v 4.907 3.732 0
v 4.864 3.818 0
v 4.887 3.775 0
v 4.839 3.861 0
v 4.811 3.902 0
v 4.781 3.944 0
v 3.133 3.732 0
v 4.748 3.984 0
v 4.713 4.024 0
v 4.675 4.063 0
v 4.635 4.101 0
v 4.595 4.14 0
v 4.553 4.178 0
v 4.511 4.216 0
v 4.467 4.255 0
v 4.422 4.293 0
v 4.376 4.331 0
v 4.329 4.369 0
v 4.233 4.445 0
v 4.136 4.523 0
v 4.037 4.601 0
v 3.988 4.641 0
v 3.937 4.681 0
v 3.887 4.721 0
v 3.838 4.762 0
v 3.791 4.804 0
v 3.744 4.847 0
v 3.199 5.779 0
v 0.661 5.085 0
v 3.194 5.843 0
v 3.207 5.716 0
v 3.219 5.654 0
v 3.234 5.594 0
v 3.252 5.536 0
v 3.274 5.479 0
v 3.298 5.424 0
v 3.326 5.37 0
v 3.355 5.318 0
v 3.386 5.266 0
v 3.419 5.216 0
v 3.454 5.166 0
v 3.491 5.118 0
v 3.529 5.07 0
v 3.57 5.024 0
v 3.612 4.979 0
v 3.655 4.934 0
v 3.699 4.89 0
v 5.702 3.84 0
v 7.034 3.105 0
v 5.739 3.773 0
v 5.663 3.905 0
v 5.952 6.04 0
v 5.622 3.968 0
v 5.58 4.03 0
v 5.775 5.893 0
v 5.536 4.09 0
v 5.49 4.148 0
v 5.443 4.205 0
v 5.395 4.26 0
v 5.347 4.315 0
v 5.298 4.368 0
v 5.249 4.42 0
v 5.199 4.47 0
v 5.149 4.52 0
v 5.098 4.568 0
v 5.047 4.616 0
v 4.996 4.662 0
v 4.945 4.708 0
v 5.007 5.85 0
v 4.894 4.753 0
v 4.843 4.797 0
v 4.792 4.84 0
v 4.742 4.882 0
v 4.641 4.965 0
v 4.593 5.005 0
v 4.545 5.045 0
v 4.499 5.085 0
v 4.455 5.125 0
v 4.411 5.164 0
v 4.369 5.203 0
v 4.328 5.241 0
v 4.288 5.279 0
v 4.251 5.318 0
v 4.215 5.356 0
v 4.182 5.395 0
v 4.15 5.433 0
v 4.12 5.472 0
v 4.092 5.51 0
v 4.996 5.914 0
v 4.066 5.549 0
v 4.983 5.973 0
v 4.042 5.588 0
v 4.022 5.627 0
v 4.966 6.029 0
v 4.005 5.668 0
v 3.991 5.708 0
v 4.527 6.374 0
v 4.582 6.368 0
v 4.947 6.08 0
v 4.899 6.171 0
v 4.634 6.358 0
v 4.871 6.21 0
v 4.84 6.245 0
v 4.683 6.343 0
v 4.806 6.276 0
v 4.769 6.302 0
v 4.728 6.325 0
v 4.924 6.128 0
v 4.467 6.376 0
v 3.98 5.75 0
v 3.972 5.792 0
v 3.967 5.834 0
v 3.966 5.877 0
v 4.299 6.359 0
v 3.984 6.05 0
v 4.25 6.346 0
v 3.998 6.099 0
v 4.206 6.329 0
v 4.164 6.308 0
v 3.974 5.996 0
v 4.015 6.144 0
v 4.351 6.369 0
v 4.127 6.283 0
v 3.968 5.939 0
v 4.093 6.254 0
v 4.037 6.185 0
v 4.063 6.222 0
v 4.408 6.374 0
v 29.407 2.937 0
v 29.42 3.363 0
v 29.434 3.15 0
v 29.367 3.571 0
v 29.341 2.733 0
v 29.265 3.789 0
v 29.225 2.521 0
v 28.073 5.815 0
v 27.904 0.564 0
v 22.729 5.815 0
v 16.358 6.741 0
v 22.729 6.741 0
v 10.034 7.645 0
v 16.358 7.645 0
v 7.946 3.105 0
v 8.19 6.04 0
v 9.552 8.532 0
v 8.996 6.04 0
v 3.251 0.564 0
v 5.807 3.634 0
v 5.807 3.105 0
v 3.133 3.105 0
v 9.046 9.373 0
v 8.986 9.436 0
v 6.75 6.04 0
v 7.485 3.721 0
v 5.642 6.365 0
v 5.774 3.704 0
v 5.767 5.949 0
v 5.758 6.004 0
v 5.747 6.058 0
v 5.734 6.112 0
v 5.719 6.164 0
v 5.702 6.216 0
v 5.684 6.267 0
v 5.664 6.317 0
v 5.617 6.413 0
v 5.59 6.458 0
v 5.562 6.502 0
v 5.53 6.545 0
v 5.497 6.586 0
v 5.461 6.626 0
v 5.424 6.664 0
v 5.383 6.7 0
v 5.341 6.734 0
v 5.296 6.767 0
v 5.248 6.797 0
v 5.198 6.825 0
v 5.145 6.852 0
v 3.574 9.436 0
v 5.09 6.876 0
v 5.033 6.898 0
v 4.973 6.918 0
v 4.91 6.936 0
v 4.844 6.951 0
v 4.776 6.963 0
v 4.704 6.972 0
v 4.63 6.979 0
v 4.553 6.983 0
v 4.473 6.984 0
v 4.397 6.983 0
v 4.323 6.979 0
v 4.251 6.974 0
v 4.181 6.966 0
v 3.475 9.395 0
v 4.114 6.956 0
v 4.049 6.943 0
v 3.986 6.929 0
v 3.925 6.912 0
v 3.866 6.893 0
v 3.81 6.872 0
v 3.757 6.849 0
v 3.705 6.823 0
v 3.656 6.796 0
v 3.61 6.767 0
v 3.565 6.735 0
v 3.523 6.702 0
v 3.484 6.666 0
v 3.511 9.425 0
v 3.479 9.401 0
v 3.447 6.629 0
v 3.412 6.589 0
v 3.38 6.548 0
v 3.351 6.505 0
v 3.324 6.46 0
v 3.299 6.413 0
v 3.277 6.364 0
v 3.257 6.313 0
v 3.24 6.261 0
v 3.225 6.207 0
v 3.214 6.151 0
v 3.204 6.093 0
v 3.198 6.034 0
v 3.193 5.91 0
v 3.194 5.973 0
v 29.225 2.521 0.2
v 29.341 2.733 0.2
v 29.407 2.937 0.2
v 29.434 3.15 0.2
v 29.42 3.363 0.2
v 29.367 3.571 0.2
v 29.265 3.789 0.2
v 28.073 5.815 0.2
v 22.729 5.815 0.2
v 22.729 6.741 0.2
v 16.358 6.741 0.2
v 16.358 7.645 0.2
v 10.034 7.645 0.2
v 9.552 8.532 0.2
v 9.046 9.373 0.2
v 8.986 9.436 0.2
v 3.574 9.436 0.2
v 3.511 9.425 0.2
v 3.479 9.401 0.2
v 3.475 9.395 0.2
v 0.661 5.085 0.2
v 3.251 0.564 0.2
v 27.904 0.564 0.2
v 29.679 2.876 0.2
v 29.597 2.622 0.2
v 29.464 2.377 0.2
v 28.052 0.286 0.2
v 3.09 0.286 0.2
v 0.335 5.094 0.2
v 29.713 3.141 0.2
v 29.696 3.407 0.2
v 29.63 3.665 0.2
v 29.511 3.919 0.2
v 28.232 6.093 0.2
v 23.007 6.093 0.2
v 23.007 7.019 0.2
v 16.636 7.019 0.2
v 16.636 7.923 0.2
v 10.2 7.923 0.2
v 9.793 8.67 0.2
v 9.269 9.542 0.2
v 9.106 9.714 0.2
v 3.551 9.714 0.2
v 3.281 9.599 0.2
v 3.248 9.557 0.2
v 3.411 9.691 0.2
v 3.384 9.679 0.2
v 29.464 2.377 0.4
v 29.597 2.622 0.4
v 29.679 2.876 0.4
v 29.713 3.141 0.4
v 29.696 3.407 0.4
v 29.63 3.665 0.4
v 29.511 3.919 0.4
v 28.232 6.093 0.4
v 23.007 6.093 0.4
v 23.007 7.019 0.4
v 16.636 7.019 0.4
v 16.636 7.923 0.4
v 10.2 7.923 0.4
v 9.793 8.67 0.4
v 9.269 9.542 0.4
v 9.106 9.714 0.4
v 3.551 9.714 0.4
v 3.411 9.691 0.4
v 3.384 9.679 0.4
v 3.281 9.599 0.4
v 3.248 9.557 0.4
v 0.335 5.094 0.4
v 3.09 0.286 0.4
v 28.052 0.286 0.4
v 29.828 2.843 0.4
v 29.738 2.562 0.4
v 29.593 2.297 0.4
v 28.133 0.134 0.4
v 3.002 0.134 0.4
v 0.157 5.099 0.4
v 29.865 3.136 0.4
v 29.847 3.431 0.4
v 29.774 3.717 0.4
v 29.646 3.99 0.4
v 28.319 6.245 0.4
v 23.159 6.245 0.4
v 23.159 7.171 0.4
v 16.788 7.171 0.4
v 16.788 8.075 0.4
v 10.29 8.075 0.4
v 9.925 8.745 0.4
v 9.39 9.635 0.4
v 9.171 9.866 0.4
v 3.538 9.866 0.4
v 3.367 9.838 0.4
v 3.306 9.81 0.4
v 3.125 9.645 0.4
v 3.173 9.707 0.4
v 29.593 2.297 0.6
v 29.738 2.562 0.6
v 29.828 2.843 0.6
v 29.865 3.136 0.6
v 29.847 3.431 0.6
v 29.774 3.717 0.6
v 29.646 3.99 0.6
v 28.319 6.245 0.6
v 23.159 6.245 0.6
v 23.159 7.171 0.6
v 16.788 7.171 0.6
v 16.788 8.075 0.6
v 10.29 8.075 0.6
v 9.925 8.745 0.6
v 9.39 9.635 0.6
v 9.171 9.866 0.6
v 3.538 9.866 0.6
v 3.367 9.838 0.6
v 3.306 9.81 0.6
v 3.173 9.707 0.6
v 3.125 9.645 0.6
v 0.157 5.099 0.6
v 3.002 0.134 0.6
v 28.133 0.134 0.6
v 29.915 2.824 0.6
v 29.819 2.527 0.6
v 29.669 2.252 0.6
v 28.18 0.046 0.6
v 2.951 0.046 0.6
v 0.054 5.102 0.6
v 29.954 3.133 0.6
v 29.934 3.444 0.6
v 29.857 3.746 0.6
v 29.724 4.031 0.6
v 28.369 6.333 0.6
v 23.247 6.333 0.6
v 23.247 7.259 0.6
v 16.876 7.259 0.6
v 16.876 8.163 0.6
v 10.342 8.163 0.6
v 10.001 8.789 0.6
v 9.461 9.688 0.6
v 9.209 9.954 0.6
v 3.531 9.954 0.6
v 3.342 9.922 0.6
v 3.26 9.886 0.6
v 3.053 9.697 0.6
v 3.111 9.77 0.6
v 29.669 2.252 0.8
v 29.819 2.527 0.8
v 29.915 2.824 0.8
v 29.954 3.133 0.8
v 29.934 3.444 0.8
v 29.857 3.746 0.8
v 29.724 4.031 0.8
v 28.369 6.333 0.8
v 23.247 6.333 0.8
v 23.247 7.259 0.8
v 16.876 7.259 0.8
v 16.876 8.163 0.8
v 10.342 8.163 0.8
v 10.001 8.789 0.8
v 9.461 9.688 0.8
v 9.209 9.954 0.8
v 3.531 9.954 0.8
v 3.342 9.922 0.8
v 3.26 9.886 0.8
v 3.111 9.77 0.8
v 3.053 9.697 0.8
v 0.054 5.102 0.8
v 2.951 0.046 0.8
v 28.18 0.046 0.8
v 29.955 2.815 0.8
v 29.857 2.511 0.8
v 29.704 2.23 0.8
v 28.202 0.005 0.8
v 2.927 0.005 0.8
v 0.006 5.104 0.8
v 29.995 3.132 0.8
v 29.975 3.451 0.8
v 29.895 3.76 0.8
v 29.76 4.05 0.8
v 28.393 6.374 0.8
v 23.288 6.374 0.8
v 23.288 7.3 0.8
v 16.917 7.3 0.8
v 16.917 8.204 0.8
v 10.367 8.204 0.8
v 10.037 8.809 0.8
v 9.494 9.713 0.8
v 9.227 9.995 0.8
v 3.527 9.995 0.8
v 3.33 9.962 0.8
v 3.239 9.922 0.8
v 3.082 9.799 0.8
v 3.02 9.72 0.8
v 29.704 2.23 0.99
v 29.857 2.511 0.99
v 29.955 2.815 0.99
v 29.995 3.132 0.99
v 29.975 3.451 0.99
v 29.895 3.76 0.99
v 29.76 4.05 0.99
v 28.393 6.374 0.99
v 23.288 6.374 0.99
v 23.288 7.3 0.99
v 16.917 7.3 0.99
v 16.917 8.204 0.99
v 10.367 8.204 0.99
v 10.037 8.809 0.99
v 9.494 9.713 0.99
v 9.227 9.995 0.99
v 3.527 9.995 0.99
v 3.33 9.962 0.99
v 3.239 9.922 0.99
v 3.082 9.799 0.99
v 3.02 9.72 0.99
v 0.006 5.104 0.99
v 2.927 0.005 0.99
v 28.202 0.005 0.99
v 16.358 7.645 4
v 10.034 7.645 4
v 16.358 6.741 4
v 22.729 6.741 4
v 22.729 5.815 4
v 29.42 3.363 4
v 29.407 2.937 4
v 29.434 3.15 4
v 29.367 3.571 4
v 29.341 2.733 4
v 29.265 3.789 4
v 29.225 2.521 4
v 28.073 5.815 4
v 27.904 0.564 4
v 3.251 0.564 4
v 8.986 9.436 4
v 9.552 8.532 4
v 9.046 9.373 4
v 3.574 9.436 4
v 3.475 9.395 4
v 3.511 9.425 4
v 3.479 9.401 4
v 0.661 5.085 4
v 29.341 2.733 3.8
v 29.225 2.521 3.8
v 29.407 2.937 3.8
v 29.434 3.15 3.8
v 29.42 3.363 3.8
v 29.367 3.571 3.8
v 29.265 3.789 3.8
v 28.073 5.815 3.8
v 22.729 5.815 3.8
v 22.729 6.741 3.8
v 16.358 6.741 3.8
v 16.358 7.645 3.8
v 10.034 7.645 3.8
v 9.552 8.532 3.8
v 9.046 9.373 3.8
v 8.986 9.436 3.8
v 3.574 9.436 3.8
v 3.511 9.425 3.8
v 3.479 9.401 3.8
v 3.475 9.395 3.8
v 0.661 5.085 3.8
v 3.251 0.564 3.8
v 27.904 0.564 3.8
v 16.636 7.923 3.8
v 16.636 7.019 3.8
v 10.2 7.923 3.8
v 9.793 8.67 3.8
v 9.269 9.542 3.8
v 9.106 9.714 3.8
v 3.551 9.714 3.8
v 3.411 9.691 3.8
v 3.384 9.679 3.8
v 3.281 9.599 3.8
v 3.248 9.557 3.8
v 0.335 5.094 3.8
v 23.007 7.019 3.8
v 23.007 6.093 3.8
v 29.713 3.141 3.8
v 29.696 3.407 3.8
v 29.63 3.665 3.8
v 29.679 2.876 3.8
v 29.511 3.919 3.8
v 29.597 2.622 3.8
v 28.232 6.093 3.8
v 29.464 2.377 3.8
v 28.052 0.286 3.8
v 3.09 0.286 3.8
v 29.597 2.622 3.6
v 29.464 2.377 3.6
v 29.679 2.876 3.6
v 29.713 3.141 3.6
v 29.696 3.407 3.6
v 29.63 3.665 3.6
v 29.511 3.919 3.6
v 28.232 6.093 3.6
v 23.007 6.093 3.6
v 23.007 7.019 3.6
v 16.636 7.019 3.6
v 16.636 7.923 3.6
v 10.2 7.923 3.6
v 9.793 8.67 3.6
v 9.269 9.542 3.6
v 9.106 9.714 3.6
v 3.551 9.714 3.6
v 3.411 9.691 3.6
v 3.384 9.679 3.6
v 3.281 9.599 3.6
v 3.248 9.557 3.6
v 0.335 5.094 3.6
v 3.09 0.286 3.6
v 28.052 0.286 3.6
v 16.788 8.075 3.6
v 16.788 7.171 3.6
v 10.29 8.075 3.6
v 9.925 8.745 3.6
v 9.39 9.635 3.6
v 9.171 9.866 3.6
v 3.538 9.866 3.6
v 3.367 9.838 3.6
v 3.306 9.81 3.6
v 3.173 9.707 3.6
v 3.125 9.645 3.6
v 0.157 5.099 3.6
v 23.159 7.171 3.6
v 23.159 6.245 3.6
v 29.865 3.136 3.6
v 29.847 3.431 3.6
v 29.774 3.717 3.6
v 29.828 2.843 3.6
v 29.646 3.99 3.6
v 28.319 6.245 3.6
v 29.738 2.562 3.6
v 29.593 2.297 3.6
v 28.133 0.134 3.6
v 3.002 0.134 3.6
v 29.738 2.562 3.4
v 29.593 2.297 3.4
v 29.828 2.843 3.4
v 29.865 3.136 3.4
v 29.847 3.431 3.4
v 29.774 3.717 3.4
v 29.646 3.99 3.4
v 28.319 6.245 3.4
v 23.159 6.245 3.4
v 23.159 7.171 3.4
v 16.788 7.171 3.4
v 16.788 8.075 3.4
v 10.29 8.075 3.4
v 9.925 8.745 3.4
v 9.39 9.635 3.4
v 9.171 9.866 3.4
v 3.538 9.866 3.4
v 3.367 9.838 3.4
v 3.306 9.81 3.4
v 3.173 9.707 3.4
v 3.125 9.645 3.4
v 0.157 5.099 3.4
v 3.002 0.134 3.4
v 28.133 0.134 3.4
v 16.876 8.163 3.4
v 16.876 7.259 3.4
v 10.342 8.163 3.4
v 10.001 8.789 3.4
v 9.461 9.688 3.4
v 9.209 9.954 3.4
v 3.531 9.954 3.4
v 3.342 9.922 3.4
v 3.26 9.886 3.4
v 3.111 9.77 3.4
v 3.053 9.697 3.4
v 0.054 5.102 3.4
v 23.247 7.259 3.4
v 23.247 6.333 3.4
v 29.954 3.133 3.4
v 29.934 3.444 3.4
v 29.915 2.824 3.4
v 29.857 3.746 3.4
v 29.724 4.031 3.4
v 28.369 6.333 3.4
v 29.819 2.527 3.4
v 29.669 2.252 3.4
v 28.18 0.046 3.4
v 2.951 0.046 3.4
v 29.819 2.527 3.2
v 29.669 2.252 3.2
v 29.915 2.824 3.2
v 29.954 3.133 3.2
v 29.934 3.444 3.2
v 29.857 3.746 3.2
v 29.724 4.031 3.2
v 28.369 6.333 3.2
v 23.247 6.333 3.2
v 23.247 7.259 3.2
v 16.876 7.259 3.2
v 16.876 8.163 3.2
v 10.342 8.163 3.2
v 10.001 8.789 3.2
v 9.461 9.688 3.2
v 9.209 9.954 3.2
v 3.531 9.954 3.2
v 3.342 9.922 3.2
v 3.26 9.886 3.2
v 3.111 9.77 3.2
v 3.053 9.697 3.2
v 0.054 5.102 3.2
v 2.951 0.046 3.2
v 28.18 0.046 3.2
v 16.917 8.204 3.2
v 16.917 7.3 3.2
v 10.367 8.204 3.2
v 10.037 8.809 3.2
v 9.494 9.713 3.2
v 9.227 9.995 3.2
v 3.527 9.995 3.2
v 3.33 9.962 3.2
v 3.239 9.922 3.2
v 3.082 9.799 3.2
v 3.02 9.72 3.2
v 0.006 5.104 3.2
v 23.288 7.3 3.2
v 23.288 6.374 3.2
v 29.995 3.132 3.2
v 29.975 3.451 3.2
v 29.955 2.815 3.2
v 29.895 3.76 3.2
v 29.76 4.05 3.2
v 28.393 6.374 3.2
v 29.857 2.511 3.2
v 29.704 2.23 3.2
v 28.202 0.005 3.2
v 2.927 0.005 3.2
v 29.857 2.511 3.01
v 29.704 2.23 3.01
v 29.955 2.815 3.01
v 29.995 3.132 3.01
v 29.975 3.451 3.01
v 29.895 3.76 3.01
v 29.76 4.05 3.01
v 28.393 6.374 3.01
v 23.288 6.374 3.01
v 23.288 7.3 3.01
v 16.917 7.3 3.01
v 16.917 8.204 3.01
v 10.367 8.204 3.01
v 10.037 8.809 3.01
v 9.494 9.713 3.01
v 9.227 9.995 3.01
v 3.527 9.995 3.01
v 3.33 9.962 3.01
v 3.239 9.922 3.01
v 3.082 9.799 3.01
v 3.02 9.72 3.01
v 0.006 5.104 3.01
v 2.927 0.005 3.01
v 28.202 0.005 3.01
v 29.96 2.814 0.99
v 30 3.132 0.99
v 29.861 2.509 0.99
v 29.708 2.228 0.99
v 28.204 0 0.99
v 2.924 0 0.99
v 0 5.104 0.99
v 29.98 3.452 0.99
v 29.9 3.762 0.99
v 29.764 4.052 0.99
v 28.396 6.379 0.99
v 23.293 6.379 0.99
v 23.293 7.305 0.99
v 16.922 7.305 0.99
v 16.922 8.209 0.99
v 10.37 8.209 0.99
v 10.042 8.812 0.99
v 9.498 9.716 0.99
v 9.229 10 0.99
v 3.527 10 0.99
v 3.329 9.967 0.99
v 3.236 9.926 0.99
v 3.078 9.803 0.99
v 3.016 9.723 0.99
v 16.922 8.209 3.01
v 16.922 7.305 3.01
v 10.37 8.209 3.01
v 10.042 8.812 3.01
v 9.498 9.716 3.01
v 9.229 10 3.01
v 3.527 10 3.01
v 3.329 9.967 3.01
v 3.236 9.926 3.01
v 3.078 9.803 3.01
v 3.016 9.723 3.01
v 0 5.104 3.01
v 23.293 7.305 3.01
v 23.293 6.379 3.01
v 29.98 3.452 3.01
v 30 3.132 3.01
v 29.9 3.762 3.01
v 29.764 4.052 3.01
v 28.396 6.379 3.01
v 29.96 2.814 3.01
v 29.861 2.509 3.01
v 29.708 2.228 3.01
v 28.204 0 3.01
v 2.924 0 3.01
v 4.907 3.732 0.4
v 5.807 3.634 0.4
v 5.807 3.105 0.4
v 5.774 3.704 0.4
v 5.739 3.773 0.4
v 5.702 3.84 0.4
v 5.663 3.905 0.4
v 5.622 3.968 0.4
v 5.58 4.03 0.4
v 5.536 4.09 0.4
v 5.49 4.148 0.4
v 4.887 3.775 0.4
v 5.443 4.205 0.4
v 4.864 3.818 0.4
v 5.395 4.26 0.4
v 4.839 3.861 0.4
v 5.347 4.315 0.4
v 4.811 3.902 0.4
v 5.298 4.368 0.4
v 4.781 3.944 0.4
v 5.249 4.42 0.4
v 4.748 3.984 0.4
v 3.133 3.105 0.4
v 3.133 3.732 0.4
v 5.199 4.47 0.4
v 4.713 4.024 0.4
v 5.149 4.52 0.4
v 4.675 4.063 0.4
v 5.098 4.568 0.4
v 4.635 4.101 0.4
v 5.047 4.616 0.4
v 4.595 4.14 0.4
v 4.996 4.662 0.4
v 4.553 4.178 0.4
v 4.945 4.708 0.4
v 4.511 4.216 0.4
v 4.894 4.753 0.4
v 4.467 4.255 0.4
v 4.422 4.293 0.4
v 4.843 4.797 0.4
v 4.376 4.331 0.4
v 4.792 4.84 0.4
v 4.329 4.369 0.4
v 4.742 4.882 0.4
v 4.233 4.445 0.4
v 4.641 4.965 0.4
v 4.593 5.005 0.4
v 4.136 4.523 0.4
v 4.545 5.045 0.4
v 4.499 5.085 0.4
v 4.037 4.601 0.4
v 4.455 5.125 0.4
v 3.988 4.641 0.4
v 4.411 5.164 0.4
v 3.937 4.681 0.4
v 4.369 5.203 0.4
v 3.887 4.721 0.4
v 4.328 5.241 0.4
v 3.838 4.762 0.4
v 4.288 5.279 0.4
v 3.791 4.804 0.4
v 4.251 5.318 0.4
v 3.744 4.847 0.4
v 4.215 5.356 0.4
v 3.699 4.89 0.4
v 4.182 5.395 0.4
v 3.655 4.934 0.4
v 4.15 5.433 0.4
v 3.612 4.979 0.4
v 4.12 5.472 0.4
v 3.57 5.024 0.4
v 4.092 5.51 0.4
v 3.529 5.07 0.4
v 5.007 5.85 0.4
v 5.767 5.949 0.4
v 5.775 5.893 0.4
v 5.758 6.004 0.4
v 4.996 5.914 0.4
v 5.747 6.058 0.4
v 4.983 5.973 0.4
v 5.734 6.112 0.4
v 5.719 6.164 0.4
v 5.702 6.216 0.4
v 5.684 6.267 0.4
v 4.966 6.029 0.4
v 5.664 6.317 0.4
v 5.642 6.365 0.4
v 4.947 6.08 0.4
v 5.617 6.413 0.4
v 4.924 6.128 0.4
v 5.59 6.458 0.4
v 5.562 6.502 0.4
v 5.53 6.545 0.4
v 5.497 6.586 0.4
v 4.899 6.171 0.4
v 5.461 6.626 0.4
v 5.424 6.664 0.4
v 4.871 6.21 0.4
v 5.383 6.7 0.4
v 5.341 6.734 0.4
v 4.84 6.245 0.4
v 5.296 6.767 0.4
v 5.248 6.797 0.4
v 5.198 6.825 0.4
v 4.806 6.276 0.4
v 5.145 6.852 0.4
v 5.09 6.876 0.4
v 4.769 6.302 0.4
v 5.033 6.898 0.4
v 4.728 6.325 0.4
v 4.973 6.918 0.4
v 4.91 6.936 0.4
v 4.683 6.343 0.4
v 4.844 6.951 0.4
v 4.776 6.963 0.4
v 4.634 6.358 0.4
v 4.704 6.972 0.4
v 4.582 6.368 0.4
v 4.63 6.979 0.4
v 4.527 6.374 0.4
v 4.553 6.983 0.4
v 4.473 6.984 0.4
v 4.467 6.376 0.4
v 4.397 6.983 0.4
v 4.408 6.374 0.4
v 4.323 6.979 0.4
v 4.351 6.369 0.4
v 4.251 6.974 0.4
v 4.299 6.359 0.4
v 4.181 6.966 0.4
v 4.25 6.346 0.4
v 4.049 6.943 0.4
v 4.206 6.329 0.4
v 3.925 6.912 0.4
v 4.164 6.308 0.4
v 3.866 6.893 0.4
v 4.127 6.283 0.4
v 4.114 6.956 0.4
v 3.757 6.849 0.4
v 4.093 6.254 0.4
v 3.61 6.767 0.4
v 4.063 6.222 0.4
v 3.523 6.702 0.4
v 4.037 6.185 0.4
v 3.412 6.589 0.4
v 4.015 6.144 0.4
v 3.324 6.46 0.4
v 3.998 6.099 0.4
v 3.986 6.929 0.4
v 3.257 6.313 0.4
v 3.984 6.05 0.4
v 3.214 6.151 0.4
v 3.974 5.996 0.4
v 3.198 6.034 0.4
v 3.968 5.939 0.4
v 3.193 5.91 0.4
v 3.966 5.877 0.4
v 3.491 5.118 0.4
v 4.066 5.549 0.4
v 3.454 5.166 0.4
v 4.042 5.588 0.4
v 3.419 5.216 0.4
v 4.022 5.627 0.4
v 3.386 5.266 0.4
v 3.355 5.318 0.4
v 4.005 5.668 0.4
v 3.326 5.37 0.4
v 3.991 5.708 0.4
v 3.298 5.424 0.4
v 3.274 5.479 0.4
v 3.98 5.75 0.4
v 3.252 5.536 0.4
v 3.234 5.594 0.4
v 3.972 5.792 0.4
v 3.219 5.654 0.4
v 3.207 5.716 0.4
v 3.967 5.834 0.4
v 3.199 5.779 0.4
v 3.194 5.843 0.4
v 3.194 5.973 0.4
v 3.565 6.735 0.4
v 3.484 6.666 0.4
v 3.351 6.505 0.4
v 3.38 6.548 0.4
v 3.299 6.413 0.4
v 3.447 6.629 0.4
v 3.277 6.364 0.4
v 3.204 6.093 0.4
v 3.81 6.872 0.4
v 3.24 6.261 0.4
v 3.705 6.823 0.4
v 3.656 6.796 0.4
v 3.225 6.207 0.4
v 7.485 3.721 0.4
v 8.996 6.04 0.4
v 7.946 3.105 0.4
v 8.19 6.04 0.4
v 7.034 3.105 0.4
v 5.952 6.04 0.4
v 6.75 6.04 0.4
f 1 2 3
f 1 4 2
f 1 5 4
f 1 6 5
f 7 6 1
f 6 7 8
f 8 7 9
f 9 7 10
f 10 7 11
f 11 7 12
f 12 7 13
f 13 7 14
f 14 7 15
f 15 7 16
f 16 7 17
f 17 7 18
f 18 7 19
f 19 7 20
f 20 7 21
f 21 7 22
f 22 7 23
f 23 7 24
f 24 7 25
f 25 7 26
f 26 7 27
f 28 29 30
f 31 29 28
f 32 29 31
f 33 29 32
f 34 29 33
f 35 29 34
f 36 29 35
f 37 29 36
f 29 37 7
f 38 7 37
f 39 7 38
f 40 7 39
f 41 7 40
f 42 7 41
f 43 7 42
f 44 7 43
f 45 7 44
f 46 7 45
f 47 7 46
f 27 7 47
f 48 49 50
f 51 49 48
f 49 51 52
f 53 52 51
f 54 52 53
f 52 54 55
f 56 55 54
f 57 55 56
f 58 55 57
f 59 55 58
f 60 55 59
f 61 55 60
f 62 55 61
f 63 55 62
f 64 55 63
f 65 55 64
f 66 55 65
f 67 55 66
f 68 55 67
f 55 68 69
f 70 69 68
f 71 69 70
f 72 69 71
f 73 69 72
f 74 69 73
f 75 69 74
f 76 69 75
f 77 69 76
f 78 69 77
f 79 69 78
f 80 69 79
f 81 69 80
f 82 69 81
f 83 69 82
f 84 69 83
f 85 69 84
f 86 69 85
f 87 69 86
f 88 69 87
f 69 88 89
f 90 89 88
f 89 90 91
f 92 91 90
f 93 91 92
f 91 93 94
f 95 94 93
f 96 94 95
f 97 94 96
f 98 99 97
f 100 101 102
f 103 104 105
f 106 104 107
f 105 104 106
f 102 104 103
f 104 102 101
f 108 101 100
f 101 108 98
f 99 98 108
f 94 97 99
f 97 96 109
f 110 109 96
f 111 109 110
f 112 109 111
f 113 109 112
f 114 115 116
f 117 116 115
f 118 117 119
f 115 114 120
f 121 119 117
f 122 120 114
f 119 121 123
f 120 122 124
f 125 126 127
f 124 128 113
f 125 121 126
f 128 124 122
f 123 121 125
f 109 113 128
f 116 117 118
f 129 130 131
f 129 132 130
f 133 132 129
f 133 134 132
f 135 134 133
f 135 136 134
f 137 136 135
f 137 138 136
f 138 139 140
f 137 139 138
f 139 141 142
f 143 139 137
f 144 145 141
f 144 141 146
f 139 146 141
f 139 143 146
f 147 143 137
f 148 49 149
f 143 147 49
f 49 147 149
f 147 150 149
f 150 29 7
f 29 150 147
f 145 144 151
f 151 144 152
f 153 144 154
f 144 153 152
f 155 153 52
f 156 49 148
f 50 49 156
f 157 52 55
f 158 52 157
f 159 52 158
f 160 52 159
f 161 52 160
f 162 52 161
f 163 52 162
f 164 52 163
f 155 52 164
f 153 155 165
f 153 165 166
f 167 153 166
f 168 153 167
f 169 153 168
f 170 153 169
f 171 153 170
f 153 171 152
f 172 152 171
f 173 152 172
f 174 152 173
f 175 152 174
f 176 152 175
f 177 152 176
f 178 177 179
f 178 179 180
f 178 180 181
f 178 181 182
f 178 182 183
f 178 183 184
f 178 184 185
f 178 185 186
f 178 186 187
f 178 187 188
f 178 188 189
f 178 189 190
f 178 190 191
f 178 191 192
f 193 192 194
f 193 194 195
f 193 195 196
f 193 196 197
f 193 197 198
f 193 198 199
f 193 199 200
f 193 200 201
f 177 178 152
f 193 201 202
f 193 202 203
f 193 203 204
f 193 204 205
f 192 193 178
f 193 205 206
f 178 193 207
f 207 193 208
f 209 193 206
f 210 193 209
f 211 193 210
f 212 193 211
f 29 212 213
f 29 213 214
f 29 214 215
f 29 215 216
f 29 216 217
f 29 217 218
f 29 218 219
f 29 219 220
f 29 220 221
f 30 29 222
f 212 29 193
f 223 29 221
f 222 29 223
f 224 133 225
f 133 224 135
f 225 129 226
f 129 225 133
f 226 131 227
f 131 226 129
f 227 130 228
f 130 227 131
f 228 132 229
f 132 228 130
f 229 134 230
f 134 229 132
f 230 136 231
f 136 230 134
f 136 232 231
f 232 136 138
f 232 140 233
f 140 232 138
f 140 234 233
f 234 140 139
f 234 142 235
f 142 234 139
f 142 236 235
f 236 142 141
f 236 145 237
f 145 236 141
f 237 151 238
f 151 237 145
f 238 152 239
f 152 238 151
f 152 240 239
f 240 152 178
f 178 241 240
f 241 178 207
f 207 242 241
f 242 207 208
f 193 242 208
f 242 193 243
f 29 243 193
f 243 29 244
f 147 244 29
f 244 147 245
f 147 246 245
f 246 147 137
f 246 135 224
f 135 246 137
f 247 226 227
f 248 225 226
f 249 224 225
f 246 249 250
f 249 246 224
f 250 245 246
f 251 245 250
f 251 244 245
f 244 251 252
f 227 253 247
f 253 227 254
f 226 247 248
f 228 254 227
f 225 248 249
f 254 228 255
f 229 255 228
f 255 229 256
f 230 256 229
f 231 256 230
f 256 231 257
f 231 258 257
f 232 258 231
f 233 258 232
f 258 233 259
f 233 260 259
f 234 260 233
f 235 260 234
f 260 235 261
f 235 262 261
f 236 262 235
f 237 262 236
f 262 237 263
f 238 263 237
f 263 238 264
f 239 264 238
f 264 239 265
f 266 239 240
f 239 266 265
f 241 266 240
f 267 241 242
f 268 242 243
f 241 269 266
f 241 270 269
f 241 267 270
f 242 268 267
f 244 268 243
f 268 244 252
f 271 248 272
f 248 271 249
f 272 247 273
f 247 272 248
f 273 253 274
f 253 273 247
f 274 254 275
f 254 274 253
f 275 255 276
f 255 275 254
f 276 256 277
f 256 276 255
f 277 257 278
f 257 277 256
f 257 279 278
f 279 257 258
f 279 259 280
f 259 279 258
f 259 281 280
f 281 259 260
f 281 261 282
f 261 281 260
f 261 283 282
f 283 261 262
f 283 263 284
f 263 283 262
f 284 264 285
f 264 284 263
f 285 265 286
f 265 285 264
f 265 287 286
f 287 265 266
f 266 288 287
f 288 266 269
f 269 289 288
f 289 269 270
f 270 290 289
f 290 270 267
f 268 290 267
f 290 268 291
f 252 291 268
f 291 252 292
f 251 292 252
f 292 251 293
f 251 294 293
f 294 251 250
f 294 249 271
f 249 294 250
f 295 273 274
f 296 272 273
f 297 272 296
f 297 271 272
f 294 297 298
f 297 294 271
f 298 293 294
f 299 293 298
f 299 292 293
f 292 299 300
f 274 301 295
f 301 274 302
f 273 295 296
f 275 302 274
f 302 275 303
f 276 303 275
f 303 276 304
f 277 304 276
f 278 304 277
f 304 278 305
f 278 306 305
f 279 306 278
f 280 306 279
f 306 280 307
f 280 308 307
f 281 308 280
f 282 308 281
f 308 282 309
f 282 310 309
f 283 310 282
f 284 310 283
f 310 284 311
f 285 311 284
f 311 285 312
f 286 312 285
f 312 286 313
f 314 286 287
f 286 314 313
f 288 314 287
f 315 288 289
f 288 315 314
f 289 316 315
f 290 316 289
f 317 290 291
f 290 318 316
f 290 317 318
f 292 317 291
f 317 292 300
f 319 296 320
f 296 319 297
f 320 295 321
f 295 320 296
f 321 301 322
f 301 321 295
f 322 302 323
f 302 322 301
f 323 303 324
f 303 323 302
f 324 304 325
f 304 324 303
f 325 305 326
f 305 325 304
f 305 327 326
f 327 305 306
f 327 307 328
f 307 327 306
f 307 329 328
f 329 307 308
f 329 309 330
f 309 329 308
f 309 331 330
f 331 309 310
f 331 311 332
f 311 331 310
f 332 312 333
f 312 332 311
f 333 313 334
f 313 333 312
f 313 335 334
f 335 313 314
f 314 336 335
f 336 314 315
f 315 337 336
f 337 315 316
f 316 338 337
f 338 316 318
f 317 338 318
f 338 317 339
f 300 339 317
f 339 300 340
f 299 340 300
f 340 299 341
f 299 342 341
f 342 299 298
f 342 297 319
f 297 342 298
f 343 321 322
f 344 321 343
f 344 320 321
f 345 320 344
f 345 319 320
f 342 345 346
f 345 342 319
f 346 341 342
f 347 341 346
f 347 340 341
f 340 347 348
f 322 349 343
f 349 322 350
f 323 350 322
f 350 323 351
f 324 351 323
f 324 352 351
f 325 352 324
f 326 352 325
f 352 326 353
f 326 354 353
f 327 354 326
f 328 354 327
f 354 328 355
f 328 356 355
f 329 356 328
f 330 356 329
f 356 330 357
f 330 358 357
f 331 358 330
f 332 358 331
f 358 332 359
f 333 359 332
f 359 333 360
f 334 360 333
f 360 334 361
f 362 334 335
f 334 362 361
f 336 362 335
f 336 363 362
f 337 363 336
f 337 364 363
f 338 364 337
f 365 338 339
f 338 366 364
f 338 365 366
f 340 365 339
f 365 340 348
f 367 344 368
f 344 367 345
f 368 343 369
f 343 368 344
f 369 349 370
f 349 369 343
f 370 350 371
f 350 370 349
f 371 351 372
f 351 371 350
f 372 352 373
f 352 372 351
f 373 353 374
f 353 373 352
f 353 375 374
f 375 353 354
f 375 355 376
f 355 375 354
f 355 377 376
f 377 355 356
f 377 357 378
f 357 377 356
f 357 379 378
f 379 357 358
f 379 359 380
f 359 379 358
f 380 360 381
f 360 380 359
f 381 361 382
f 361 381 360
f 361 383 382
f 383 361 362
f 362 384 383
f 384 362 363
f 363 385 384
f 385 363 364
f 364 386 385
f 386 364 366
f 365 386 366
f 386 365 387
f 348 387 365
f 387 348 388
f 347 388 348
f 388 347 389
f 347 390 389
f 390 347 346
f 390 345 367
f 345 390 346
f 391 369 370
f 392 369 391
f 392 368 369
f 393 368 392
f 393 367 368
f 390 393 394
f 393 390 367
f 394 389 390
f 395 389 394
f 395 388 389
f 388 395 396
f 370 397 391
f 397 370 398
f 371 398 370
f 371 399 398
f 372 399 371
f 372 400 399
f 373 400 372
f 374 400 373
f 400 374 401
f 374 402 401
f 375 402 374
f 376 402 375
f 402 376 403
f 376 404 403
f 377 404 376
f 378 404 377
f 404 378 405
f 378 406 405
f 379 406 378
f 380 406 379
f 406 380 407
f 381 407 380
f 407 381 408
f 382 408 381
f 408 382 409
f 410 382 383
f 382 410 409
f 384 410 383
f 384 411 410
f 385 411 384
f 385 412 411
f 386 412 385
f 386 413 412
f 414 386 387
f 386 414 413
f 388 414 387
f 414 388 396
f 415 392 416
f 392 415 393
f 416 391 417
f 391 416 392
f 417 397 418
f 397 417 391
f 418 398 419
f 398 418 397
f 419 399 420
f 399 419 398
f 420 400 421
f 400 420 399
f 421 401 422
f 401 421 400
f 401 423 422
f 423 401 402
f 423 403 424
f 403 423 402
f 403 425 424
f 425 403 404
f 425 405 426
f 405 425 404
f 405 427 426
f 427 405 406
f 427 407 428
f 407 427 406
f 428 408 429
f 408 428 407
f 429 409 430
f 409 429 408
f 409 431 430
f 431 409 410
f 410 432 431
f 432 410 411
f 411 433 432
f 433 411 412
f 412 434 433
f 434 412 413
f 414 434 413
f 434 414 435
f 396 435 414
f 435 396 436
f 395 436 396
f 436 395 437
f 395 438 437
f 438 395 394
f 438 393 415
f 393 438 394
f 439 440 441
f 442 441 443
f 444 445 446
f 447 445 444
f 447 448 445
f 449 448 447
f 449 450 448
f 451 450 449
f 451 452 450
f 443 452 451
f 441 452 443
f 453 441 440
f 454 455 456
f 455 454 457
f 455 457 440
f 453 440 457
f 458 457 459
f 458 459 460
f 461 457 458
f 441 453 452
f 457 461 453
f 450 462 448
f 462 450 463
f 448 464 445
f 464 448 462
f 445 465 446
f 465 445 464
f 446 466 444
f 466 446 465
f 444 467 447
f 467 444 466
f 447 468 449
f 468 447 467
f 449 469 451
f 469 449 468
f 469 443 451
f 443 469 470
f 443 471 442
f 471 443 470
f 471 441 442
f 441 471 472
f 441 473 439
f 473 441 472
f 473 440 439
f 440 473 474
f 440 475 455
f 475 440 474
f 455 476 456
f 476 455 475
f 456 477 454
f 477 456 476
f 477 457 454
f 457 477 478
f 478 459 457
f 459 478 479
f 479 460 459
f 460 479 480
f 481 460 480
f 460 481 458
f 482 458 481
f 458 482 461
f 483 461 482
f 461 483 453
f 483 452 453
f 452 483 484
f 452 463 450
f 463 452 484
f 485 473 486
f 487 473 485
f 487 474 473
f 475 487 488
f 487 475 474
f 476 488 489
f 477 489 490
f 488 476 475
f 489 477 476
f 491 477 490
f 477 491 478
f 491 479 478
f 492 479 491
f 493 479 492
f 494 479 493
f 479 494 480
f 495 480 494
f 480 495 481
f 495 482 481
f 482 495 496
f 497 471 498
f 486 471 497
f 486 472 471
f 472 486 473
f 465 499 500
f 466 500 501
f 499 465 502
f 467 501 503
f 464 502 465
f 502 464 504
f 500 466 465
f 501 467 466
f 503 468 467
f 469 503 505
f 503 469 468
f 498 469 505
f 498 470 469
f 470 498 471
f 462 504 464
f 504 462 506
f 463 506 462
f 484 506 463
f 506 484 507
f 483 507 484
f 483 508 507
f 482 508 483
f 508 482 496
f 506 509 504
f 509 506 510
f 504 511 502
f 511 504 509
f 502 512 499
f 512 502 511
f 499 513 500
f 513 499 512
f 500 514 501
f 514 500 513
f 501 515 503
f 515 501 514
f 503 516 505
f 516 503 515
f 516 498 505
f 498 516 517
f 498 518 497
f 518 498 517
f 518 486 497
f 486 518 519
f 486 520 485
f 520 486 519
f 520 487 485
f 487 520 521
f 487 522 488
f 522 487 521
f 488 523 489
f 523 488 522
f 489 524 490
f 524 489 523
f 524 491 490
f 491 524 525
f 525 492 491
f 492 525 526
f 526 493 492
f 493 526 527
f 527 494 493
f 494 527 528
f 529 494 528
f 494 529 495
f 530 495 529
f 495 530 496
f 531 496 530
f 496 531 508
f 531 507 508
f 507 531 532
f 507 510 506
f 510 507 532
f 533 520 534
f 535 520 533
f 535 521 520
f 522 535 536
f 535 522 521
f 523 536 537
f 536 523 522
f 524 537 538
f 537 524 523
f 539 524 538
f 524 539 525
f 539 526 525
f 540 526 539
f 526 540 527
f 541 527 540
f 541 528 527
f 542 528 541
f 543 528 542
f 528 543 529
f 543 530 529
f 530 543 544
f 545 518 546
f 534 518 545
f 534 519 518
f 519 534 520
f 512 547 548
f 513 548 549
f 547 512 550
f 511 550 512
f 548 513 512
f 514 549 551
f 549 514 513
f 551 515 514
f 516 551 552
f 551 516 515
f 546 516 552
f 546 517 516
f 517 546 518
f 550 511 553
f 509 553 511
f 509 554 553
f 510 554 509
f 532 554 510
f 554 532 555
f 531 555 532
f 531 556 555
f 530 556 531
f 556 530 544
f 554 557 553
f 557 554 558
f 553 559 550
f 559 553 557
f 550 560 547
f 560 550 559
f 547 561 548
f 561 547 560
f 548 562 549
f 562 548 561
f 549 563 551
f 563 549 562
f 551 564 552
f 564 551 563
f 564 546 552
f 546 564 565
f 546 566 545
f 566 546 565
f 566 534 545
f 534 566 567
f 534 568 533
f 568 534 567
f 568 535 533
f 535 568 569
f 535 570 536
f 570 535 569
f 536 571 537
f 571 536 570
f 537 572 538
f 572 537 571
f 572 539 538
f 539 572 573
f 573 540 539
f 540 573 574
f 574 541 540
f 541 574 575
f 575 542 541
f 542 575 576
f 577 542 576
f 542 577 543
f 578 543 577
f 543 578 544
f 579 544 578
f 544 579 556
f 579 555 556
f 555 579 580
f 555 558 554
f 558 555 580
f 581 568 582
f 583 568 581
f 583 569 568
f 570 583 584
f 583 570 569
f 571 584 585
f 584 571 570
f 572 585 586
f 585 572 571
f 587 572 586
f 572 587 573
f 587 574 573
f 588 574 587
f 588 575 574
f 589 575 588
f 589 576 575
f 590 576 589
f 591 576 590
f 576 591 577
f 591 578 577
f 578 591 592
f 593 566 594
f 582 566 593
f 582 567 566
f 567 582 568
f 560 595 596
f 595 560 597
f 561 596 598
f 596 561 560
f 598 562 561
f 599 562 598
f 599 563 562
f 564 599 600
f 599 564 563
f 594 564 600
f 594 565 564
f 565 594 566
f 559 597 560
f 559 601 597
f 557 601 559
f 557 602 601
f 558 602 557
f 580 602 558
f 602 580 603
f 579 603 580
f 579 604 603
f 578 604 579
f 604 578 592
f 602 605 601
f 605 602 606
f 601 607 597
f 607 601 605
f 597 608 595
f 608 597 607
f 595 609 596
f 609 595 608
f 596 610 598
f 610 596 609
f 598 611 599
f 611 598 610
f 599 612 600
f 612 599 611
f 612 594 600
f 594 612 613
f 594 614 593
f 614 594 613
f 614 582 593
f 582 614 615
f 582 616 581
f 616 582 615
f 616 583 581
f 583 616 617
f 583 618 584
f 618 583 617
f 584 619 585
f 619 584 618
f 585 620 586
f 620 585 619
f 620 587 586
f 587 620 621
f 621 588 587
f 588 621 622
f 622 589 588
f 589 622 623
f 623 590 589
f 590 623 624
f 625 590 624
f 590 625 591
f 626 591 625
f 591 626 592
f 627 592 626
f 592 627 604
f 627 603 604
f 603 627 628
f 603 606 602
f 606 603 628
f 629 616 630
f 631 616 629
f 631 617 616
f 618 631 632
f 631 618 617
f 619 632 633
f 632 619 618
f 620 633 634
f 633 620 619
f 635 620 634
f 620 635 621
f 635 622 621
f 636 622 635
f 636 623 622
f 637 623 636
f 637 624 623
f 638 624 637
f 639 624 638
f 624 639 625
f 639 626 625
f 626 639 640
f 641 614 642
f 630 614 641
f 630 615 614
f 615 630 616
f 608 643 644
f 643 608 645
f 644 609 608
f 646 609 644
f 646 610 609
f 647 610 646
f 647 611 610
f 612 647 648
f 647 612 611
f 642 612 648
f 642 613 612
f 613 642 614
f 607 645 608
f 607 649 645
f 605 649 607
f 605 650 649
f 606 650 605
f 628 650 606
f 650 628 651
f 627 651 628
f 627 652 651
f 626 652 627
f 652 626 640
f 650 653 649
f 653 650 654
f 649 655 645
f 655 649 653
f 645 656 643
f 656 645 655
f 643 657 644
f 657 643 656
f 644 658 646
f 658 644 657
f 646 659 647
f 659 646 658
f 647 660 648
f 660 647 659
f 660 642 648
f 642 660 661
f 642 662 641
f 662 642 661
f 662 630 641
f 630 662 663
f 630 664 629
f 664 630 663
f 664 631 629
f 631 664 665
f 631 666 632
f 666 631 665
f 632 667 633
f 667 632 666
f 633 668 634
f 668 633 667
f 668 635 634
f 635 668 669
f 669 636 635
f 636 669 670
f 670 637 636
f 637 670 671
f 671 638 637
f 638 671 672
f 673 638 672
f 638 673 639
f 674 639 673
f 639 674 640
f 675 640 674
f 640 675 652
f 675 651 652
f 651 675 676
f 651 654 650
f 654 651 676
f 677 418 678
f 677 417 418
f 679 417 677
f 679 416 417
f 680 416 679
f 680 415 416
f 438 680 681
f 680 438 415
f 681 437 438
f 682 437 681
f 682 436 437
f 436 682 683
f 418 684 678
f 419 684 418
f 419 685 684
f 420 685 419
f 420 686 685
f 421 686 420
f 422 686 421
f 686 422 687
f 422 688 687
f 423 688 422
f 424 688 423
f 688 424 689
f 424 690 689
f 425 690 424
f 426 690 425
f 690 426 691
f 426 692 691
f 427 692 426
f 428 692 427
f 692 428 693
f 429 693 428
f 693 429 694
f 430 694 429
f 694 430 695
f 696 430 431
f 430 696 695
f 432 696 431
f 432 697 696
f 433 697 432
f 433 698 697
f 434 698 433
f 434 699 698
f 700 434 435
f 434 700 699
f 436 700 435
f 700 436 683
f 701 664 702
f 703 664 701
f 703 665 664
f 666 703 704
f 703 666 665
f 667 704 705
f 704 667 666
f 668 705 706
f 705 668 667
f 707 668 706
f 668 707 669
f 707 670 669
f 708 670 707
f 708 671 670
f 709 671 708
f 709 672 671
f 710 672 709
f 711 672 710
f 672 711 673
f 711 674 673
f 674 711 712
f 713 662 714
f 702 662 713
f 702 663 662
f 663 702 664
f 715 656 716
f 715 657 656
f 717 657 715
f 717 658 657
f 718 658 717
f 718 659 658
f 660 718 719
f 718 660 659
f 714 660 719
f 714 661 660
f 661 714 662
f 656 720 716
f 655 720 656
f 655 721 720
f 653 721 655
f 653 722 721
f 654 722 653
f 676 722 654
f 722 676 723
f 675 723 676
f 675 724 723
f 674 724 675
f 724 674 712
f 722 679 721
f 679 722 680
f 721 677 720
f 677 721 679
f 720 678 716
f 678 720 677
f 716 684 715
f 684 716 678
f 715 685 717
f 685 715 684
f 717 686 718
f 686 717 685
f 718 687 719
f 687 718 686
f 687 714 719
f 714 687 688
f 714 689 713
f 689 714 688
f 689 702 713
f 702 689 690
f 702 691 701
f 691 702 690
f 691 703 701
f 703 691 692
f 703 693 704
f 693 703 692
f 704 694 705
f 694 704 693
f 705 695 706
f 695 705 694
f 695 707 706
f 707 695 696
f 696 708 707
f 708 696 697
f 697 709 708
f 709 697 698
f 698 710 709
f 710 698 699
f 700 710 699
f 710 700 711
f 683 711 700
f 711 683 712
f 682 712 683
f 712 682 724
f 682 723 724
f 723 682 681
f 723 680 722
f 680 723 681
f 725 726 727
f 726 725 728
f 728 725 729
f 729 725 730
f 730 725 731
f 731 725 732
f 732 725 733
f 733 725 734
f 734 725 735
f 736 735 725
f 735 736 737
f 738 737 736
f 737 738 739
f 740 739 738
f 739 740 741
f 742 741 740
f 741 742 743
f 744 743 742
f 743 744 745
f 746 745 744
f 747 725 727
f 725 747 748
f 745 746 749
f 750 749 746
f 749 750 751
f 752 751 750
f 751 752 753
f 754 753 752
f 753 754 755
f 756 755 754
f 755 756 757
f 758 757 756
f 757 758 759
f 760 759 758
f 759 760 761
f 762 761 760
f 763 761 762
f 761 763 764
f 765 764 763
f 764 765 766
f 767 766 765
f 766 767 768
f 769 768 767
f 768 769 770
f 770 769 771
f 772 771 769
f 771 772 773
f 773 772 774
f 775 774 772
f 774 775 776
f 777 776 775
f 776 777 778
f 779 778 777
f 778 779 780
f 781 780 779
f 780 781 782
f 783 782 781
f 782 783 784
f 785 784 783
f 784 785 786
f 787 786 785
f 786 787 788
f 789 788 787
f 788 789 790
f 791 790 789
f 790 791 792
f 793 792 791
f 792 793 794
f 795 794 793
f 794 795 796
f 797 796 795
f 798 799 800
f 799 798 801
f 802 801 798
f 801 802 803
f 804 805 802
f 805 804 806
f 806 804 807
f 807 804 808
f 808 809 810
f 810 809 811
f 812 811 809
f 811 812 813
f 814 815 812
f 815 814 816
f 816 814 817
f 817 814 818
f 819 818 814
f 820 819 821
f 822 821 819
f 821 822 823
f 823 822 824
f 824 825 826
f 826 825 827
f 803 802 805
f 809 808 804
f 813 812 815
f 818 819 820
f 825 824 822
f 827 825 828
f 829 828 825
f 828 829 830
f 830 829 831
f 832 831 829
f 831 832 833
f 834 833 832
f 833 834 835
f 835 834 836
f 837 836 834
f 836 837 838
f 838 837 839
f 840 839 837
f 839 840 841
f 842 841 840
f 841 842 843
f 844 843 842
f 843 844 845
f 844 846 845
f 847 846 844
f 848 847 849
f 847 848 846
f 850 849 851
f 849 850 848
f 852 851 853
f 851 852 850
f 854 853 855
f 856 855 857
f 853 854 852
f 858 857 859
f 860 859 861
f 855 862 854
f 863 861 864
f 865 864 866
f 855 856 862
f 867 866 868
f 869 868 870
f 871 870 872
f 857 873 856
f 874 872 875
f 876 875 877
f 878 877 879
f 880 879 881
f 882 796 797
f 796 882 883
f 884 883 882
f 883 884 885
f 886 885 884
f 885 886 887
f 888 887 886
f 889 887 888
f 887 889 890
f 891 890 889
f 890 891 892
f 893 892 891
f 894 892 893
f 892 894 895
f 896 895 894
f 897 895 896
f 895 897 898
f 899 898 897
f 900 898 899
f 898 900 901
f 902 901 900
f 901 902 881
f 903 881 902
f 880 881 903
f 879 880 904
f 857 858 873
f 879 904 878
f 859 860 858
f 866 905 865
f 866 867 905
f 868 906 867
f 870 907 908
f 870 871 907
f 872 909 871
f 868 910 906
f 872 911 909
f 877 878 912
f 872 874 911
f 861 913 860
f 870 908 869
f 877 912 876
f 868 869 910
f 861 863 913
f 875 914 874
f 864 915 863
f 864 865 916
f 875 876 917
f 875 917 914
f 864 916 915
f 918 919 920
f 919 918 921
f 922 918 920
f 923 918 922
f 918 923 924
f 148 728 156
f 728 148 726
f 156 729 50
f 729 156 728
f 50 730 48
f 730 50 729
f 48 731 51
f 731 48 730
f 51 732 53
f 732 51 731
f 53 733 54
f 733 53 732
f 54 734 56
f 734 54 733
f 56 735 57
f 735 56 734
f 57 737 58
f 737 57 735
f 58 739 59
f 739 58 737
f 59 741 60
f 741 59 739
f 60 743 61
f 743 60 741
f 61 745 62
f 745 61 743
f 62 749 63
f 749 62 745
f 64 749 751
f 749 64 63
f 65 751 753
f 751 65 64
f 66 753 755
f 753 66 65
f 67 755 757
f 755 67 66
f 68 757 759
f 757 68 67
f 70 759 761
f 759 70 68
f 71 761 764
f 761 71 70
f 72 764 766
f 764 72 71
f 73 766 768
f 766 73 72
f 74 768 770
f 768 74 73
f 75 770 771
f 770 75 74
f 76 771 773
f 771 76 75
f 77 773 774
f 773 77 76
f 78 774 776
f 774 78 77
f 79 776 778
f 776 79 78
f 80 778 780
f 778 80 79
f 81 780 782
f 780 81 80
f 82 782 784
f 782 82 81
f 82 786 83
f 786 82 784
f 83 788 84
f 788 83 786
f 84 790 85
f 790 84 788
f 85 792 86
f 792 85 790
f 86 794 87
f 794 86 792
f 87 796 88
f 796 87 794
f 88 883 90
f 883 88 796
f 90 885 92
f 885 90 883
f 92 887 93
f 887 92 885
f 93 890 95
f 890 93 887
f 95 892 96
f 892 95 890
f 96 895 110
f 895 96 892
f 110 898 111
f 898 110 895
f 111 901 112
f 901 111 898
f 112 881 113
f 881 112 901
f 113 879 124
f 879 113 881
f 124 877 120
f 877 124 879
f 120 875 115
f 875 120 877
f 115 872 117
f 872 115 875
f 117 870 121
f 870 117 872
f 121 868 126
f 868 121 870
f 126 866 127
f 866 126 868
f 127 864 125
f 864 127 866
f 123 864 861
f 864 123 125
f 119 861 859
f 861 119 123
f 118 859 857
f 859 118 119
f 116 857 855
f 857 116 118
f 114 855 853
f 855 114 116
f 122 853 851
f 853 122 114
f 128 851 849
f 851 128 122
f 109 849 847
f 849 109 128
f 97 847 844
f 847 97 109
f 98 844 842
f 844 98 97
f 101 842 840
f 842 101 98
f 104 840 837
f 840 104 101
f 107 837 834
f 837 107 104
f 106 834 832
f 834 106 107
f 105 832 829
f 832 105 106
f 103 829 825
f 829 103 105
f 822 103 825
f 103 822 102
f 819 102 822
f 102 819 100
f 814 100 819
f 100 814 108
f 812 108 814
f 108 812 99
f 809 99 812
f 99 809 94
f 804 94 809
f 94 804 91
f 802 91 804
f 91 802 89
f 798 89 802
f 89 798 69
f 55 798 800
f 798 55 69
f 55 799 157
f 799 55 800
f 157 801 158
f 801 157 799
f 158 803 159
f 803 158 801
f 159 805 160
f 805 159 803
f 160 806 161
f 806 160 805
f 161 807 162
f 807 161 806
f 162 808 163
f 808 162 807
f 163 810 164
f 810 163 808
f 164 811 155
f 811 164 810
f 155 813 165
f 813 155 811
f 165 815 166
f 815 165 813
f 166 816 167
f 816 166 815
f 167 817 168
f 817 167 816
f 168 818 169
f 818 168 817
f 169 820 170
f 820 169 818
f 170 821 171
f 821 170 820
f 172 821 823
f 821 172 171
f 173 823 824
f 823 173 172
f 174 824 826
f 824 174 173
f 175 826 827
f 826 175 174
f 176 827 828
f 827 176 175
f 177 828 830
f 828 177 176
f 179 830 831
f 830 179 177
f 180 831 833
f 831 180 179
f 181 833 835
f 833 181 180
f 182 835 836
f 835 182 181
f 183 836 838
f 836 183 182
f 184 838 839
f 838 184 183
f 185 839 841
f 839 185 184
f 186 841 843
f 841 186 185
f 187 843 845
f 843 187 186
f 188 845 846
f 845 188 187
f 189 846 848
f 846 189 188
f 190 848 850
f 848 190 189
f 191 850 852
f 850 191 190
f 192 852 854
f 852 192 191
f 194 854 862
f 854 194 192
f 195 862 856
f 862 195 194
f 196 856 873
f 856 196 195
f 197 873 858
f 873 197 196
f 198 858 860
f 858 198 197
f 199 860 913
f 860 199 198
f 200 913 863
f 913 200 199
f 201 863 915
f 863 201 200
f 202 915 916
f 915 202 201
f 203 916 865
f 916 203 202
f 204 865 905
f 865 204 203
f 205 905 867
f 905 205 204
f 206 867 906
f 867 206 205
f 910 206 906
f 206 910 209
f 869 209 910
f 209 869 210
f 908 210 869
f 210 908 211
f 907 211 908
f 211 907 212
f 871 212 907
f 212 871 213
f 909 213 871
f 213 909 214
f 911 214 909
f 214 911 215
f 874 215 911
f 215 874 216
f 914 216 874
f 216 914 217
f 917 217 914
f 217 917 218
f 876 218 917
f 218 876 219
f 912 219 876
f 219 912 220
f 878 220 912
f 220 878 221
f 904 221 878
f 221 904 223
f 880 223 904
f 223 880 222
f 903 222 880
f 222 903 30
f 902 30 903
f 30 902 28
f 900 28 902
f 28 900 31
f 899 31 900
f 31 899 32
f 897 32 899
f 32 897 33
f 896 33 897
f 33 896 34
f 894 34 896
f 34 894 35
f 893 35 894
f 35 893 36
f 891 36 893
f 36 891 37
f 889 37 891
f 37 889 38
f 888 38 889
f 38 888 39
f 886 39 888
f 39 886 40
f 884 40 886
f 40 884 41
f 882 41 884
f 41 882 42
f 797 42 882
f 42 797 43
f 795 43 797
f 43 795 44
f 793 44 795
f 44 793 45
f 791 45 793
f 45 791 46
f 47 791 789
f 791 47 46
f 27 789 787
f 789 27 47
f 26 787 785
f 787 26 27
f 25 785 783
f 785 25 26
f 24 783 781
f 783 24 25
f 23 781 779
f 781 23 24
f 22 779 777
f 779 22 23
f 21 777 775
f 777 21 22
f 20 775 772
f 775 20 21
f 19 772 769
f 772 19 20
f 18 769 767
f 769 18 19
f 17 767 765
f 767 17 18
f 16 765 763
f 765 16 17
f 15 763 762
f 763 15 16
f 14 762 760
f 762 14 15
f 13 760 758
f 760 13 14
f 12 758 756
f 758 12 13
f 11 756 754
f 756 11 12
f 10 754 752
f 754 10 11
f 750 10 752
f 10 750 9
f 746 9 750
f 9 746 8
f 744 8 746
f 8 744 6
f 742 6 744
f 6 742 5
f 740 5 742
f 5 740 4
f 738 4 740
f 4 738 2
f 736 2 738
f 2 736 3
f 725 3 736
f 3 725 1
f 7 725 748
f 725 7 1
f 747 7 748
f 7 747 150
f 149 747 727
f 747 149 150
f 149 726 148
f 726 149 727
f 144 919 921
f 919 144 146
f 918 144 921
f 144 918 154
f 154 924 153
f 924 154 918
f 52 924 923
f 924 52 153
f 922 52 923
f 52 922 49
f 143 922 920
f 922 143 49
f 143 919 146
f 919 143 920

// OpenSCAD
// test3 — generated by protobot from a sketch (input.jpg)
// 2026-10-28
//
// Print: Prusa Core One, 0.4 mm nozzle, PLA, 0.2 mm layers, flat on the bed.
// The outline is stored in a 0..1 unit box and scaled by LENGTH/WIDTH, so
// the three measurements below are all you need to change. Re-export with:
//   openscad --backend=manifold --export-format binstl -o test3.stl test3.scad
//
// Dimension tags: [M] = given by the user, [S] = traced from the sketch.

/* [Measurements] */
LENGTH    = 30;   // [M] X extent, mm
WIDTH     = 10;   // [M] Y extent, mm
THICKNESS = 4;   // [M] extrusion height, mm

/* [Edge finish] */
// Perimeter edges (outline AND holes), top and bottom faces.
// "fillet" = rounded, "chamfer" = 45°, "none" = sharp. Built in LAYER steps,
// i.e. exactly as the printer will lay it down.
EDGE_TOP_KIND    = "fillet";
EDGE_TOP         = 1;     // mm
EDGE_BOTTOM_KIND = "fillet";
EDGE_BOTTOM      = 1;     // mm
LAYER            = 0.2;   // mm, print layer height

/* [Version stamp] */
VERSION        = 2;       // bump every revision
VERSION_POS    = [0.2000, 0.5000];  // [S] unit-box spot deepest inside the shape
VERSION_SIZE   = 4;      // mm text height
VERSION_DEPTH  = 0.4;    // mm, 2 layers at 0.2

/* [Hidden] */
// [S] traced outline (+ holes), unit box, y up.
OUTLINE_PTS = [
    [0.94652,0.63789], [0.99215,0.40522], [0.99668,0.37621], [0.99933,0.34517], [1.00000,0.31319], [0.99867,0.28140],
    [0.99539,0.25091], [0.99027,0.22279], [0.94014,0.00000], [0.09748,0.00000], [0.00000,0.51040], [0.10054,0.97234],
    [0.10261,0.98029], [0.10789,0.99264], [0.11097,0.99669], [0.11758,1.00000], [0.30764,1.00000], [0.31660,0.97162],
    [0.33472,0.88120], [0.34567,0.82088], [0.56407,0.82088], [0.56407,0.73052], [0.77645,0.73052], [0.77645,0.63789]
];
OUTLINE_PATHS = [
    [for (i = [0:23]) i]
];

module outline_2d() {
    scale([LENGTH, WIDTH]) polygon(points = OUTLINE_PTS, paths = OUTLINE_PATHS);
}

// Debossed into the bottom face, mirrored so it reads from underneath.
module version_stamp() {
    if (!is_undef(VERSION_POS) && VERSION_SIZE > 0)
        translate([VERSION_POS[0] * LENGTH, VERSION_POS[1] * WIDTH, -0.01])
            linear_extrude(VERSION_DEPTH + 0.01)
                mirror([1, 0])
                    text(str("v", VERSION), size = VERSION_SIZE,
                         font = "Liberation Sans:style=Bold",
                         halign = "center", valign = "center");
}

// How far the outline is pulled in at depth d (0..r) into a finished edge.
function edge_inset(kind, r, d) =
    kind == "chamfer" ? max(0, r - d) :
    kind == "fillet"  ? r - sqrt(max(0, r * r - (r - min(d, r)) * (r - min(d, r)))) : 0;

module body() {
    nb = EDGE_BOTTOM_KIND == "none" ? 0 : ceil(EDGE_BOTTOM / LAYER - 1e-6);
    nt = EDGE_TOP_KIND    == "none" ? 0 : ceil(EDGE_TOP / LAYER - 1e-6);
    zb = nb * LAYER;
    zt = nt * LAYER;
    union() {
        // straight-walled core, overlapping the finished layers (no shared faces)
        translate([0, 0, zb - (nb > 0 ? 0.01 : 0)])
            linear_extrude(THICKNESS - zb - zt + (nb > 0 ? 0.01 : 0) + (nt > 0 ? 0.01 : 0))
                outline_2d();
        if (nb > 0) for (i = [0 : nb - 1])
            translate([0, 0, i * LAYER])
                linear_extrude(LAYER + 0.01)
                    offset(delta = -edge_inset(EDGE_BOTTOM_KIND, EDGE_BOTTOM, (i + 0.5) * LAYER))
                        outline_2d();
        if (nt > 0) for (i = [0 : nt - 1])
            translate([0, 0, THICKNESS - (i + 1) * LAYER - (i < nt - 1 ? 0.01 : 0)])
                linear_extrude(LAYER + (i < nt - 1 ? 0.01 : 0))
                    offset(delta = -edge_inset(EDGE_TOP_KIND, EDGE_TOP, (i + 0.5) * LAYER))
                        outline_2d();
    }
}

module part() {
    $fa = 2; $fs = 0.4;
    difference() {
        body();
        version_stamp();
    }
}

part();
